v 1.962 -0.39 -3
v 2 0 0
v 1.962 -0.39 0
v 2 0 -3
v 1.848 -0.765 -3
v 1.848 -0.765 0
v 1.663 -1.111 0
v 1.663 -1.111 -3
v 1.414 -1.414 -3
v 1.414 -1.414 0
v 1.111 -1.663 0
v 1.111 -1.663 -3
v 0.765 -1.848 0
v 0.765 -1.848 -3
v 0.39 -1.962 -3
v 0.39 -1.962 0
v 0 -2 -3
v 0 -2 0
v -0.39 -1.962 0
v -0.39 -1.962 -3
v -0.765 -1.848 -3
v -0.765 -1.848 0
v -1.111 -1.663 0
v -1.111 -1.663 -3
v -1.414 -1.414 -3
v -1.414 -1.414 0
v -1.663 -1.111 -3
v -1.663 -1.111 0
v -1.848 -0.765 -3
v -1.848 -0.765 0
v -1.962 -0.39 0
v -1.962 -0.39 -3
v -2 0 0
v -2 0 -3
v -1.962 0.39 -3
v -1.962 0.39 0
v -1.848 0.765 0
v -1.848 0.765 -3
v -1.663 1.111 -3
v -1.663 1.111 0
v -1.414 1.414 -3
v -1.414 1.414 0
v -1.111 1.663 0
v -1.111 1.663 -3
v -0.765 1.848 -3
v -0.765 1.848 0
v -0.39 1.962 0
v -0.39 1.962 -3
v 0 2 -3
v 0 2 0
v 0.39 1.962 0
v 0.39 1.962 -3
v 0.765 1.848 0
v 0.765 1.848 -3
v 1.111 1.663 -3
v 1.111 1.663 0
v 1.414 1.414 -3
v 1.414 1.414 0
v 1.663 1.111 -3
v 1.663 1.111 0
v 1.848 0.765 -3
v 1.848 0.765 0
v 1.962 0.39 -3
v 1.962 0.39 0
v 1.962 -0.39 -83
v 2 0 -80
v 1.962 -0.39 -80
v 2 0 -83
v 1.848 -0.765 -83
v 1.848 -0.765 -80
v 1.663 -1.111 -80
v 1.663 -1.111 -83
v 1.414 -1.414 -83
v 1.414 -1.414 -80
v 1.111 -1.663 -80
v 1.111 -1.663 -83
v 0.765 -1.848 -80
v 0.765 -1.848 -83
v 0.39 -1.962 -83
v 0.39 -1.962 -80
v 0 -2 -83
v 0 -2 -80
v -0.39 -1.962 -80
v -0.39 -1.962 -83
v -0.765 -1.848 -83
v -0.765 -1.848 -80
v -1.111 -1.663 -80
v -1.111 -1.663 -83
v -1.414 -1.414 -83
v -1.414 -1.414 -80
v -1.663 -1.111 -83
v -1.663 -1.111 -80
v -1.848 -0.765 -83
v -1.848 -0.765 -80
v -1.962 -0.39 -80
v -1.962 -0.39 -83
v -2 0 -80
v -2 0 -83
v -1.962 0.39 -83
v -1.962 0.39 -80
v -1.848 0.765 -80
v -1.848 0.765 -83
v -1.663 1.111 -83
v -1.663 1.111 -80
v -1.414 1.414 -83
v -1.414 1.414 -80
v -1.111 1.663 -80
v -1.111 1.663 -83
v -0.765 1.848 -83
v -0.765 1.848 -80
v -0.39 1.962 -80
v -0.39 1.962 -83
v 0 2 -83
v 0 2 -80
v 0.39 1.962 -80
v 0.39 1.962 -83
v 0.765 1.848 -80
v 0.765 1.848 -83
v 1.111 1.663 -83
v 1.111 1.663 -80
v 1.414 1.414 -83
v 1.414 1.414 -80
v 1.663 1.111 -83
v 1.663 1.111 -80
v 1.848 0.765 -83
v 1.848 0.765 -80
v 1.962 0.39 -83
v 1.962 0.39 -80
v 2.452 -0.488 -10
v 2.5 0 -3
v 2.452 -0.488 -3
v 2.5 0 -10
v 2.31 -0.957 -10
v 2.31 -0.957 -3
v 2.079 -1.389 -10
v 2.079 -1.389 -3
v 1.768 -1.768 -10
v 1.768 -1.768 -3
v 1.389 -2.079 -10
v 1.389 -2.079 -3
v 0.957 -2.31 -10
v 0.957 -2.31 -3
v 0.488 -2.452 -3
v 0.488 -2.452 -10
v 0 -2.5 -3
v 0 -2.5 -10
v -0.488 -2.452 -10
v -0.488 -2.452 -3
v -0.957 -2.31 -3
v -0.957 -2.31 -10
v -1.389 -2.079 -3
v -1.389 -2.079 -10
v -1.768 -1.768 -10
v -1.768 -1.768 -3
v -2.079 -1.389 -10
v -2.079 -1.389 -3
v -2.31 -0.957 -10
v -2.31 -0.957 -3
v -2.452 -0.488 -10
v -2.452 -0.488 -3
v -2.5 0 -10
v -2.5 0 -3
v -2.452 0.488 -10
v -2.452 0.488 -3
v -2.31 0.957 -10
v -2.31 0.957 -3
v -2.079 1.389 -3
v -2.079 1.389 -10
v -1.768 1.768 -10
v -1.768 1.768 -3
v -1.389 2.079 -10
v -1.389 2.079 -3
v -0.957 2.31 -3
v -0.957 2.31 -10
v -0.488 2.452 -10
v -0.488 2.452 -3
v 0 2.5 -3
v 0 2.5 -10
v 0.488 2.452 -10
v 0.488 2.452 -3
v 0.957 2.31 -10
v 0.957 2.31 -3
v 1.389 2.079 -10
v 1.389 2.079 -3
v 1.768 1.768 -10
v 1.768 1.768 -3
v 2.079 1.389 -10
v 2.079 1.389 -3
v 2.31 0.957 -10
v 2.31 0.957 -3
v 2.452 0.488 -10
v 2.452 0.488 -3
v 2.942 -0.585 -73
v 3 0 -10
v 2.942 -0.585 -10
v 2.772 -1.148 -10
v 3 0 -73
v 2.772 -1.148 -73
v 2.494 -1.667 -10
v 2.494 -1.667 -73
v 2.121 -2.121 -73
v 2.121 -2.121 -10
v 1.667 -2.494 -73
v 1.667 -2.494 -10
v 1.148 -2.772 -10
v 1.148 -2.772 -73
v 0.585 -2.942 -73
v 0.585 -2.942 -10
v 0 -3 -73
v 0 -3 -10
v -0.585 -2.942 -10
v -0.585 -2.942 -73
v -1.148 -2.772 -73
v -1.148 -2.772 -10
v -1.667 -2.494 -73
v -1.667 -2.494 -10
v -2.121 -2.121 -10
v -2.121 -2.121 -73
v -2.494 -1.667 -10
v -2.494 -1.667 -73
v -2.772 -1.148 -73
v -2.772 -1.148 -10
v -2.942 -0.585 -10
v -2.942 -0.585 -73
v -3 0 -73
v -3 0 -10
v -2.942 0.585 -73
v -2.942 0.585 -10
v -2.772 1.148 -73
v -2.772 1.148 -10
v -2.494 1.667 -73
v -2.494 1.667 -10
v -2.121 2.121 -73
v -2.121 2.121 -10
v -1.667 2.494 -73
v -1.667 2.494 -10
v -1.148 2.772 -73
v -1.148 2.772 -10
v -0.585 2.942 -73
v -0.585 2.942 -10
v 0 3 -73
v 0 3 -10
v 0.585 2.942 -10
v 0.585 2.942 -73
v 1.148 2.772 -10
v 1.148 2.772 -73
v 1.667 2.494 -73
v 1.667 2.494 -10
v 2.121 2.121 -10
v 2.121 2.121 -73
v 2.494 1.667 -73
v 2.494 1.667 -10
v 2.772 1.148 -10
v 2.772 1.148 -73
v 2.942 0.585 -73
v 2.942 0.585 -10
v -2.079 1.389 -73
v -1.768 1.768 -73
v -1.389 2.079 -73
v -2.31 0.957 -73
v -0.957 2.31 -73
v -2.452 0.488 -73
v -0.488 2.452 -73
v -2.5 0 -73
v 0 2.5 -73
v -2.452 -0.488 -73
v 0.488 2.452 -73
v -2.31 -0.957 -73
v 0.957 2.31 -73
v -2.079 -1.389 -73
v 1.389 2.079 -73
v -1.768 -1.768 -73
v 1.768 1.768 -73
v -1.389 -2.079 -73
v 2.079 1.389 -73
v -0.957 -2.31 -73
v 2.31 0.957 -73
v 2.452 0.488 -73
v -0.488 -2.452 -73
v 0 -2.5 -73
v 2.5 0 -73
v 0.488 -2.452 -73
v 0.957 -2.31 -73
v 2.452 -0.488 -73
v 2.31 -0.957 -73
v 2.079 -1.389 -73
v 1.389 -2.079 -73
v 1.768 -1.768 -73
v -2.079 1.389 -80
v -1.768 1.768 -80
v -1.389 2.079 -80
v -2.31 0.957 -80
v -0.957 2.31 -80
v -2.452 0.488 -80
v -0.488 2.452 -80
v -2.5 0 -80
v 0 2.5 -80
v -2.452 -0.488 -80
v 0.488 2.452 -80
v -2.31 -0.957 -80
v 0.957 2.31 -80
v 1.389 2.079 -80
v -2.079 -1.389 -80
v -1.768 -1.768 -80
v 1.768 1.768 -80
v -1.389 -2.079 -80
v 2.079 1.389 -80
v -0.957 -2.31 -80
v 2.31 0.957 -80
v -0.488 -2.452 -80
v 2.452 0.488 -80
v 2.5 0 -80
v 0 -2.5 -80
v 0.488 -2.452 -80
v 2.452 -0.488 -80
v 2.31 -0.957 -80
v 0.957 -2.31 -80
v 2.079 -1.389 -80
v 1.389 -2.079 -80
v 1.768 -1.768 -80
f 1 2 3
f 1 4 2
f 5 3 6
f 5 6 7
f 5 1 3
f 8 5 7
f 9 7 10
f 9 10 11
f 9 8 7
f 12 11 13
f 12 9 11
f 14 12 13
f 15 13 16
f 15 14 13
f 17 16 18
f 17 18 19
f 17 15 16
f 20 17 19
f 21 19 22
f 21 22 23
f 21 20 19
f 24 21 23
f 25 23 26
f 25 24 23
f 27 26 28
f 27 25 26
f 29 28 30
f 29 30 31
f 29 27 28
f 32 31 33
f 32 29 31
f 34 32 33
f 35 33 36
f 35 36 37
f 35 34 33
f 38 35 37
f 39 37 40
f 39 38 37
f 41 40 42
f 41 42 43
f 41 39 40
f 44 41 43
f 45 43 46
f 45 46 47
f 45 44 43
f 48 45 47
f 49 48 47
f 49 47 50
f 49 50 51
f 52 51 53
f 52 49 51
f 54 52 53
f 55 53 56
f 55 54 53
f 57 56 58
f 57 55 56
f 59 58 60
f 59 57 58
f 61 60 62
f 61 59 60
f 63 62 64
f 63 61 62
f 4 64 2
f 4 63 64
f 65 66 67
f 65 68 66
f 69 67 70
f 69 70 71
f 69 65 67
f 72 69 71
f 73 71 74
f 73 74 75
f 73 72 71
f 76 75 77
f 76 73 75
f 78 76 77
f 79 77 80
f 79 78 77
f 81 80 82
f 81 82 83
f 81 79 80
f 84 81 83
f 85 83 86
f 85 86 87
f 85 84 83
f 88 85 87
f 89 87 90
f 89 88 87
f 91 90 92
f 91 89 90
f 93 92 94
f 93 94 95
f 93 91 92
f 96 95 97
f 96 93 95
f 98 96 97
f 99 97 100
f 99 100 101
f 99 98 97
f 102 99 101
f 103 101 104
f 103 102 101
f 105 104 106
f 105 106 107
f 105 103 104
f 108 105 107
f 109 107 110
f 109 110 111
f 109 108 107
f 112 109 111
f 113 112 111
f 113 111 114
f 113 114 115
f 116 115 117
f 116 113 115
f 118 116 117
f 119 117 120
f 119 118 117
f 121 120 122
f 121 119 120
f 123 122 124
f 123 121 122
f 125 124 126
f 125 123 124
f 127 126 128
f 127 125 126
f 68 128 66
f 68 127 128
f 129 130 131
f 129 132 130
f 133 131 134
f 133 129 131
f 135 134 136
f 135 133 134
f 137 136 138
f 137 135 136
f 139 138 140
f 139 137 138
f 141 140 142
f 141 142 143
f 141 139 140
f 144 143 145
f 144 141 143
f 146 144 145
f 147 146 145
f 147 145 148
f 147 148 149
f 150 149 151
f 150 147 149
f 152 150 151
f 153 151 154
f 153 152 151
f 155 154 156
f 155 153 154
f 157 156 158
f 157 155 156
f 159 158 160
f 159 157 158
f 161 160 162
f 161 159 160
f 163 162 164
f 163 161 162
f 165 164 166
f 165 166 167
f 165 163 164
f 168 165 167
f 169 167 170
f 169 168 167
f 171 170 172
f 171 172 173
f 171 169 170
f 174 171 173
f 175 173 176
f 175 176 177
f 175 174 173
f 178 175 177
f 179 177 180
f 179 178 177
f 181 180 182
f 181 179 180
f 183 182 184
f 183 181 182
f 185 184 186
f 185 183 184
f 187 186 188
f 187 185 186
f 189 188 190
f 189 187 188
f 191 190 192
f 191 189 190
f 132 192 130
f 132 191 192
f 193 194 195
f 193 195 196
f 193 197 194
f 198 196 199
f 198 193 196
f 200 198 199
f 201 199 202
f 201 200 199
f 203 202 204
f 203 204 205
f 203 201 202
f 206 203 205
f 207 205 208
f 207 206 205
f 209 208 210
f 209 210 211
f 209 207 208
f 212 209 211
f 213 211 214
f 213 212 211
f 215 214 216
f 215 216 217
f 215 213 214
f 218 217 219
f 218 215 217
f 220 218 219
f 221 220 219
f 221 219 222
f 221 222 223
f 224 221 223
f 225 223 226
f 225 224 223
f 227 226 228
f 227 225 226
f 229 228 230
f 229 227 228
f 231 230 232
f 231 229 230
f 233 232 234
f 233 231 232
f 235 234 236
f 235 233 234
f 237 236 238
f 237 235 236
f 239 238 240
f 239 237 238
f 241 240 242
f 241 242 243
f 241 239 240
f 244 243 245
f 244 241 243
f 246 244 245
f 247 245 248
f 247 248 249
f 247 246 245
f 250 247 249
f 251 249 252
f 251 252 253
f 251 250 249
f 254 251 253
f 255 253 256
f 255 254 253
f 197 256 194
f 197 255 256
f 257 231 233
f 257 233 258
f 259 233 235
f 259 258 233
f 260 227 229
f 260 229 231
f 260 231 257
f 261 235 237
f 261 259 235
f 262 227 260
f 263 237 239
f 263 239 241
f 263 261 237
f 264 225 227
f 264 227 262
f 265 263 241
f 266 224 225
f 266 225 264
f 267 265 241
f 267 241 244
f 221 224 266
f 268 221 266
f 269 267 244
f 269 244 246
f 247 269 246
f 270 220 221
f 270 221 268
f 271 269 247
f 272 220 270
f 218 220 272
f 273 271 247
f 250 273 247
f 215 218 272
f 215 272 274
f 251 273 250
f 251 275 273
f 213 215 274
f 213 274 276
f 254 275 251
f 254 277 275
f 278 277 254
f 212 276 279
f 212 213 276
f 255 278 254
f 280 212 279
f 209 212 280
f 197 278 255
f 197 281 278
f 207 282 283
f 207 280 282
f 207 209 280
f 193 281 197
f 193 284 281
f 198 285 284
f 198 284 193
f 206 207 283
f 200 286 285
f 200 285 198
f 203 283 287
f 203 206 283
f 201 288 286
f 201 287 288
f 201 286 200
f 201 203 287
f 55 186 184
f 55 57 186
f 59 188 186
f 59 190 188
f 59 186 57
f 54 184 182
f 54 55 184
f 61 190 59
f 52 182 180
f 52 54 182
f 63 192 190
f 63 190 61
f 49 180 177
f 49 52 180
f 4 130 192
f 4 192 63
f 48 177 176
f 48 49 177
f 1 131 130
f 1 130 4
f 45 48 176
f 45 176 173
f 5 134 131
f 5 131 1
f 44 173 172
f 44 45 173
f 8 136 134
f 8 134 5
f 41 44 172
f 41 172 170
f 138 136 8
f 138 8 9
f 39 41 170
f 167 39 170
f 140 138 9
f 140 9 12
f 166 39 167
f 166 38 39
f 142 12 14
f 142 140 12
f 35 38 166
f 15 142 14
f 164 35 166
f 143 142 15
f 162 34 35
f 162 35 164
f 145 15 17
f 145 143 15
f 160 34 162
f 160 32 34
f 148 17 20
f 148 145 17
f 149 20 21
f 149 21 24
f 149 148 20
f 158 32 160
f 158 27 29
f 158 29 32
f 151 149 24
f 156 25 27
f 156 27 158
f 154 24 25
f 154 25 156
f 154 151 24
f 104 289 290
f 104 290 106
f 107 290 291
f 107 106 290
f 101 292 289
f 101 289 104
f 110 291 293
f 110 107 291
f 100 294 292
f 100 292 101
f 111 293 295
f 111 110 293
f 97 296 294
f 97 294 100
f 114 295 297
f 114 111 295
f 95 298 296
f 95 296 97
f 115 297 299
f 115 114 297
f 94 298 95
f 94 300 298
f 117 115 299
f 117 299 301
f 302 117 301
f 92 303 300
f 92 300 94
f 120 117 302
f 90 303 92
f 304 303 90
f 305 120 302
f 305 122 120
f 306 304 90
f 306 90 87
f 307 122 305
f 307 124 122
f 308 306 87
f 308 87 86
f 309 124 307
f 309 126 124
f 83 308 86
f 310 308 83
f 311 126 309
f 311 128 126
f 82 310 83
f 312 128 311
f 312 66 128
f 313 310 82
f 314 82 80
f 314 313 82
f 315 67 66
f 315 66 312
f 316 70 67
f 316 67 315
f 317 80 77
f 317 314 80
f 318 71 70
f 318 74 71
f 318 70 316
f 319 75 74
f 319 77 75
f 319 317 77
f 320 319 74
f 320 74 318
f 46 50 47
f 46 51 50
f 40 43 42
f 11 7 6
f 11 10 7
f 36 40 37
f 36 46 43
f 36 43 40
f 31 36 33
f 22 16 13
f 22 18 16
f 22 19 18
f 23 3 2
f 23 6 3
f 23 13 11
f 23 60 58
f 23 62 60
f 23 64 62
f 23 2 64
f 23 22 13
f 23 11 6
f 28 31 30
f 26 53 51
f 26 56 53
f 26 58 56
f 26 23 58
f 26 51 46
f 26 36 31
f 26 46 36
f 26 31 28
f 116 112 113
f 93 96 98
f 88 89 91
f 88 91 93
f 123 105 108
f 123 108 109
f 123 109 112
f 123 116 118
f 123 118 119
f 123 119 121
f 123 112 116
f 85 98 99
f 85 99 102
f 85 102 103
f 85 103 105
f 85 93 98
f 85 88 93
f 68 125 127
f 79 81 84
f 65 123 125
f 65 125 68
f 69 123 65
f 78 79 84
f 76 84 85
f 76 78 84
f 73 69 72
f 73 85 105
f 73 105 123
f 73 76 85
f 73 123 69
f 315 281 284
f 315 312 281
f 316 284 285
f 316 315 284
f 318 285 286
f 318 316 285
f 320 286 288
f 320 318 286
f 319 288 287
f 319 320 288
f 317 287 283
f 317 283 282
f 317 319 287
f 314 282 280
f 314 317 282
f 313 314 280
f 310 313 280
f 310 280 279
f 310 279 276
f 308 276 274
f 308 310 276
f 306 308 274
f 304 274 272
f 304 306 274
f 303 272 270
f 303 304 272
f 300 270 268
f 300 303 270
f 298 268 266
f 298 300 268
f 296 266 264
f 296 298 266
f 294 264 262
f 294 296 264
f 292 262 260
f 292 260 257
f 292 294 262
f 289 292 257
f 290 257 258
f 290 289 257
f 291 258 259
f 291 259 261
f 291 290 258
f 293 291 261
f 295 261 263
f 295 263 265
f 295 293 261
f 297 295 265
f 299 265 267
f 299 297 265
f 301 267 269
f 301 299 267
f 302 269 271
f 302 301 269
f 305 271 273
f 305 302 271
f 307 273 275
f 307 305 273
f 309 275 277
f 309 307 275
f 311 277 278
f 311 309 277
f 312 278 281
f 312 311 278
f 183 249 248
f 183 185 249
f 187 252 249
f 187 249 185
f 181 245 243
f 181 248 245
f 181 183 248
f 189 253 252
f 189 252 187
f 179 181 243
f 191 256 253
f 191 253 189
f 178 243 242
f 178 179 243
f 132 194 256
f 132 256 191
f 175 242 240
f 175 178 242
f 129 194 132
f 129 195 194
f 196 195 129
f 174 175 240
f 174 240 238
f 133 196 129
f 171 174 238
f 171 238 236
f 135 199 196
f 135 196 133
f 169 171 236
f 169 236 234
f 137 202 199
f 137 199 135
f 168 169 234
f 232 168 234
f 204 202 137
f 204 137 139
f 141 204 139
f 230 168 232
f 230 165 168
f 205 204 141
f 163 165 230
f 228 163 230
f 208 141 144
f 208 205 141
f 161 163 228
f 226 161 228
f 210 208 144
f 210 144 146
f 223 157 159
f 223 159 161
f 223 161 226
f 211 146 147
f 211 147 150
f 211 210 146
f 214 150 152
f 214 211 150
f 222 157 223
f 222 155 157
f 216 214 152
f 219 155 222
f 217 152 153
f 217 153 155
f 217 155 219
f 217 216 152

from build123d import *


with BuildPart() as part:
    # Sketch1 → Revolve1 (revolve)
    with BuildSketch(Plane(origin=(0, 0, 0), x_dir=(0, 0, -1), z_dir=(1, 0, 0)), mode=Mode.PRIVATE) as revolve1_sk:
        Polygon((0, 0), (0, 2), (3, 2), (3, 2.5), (10, 2.5), (10, 3), (73, 3), (73, 2.5), (80, 2.5), (80, 2), (83, 2), (83, 0), align=None)
    revolve(revolve1_sk.sketch.rotate(Axis((0, 0, 10.073341037), (0, 0, -1)), 90), axis=Axis((0, 0, 10.073341037), (0, 0, -1)))


solid = part.part
